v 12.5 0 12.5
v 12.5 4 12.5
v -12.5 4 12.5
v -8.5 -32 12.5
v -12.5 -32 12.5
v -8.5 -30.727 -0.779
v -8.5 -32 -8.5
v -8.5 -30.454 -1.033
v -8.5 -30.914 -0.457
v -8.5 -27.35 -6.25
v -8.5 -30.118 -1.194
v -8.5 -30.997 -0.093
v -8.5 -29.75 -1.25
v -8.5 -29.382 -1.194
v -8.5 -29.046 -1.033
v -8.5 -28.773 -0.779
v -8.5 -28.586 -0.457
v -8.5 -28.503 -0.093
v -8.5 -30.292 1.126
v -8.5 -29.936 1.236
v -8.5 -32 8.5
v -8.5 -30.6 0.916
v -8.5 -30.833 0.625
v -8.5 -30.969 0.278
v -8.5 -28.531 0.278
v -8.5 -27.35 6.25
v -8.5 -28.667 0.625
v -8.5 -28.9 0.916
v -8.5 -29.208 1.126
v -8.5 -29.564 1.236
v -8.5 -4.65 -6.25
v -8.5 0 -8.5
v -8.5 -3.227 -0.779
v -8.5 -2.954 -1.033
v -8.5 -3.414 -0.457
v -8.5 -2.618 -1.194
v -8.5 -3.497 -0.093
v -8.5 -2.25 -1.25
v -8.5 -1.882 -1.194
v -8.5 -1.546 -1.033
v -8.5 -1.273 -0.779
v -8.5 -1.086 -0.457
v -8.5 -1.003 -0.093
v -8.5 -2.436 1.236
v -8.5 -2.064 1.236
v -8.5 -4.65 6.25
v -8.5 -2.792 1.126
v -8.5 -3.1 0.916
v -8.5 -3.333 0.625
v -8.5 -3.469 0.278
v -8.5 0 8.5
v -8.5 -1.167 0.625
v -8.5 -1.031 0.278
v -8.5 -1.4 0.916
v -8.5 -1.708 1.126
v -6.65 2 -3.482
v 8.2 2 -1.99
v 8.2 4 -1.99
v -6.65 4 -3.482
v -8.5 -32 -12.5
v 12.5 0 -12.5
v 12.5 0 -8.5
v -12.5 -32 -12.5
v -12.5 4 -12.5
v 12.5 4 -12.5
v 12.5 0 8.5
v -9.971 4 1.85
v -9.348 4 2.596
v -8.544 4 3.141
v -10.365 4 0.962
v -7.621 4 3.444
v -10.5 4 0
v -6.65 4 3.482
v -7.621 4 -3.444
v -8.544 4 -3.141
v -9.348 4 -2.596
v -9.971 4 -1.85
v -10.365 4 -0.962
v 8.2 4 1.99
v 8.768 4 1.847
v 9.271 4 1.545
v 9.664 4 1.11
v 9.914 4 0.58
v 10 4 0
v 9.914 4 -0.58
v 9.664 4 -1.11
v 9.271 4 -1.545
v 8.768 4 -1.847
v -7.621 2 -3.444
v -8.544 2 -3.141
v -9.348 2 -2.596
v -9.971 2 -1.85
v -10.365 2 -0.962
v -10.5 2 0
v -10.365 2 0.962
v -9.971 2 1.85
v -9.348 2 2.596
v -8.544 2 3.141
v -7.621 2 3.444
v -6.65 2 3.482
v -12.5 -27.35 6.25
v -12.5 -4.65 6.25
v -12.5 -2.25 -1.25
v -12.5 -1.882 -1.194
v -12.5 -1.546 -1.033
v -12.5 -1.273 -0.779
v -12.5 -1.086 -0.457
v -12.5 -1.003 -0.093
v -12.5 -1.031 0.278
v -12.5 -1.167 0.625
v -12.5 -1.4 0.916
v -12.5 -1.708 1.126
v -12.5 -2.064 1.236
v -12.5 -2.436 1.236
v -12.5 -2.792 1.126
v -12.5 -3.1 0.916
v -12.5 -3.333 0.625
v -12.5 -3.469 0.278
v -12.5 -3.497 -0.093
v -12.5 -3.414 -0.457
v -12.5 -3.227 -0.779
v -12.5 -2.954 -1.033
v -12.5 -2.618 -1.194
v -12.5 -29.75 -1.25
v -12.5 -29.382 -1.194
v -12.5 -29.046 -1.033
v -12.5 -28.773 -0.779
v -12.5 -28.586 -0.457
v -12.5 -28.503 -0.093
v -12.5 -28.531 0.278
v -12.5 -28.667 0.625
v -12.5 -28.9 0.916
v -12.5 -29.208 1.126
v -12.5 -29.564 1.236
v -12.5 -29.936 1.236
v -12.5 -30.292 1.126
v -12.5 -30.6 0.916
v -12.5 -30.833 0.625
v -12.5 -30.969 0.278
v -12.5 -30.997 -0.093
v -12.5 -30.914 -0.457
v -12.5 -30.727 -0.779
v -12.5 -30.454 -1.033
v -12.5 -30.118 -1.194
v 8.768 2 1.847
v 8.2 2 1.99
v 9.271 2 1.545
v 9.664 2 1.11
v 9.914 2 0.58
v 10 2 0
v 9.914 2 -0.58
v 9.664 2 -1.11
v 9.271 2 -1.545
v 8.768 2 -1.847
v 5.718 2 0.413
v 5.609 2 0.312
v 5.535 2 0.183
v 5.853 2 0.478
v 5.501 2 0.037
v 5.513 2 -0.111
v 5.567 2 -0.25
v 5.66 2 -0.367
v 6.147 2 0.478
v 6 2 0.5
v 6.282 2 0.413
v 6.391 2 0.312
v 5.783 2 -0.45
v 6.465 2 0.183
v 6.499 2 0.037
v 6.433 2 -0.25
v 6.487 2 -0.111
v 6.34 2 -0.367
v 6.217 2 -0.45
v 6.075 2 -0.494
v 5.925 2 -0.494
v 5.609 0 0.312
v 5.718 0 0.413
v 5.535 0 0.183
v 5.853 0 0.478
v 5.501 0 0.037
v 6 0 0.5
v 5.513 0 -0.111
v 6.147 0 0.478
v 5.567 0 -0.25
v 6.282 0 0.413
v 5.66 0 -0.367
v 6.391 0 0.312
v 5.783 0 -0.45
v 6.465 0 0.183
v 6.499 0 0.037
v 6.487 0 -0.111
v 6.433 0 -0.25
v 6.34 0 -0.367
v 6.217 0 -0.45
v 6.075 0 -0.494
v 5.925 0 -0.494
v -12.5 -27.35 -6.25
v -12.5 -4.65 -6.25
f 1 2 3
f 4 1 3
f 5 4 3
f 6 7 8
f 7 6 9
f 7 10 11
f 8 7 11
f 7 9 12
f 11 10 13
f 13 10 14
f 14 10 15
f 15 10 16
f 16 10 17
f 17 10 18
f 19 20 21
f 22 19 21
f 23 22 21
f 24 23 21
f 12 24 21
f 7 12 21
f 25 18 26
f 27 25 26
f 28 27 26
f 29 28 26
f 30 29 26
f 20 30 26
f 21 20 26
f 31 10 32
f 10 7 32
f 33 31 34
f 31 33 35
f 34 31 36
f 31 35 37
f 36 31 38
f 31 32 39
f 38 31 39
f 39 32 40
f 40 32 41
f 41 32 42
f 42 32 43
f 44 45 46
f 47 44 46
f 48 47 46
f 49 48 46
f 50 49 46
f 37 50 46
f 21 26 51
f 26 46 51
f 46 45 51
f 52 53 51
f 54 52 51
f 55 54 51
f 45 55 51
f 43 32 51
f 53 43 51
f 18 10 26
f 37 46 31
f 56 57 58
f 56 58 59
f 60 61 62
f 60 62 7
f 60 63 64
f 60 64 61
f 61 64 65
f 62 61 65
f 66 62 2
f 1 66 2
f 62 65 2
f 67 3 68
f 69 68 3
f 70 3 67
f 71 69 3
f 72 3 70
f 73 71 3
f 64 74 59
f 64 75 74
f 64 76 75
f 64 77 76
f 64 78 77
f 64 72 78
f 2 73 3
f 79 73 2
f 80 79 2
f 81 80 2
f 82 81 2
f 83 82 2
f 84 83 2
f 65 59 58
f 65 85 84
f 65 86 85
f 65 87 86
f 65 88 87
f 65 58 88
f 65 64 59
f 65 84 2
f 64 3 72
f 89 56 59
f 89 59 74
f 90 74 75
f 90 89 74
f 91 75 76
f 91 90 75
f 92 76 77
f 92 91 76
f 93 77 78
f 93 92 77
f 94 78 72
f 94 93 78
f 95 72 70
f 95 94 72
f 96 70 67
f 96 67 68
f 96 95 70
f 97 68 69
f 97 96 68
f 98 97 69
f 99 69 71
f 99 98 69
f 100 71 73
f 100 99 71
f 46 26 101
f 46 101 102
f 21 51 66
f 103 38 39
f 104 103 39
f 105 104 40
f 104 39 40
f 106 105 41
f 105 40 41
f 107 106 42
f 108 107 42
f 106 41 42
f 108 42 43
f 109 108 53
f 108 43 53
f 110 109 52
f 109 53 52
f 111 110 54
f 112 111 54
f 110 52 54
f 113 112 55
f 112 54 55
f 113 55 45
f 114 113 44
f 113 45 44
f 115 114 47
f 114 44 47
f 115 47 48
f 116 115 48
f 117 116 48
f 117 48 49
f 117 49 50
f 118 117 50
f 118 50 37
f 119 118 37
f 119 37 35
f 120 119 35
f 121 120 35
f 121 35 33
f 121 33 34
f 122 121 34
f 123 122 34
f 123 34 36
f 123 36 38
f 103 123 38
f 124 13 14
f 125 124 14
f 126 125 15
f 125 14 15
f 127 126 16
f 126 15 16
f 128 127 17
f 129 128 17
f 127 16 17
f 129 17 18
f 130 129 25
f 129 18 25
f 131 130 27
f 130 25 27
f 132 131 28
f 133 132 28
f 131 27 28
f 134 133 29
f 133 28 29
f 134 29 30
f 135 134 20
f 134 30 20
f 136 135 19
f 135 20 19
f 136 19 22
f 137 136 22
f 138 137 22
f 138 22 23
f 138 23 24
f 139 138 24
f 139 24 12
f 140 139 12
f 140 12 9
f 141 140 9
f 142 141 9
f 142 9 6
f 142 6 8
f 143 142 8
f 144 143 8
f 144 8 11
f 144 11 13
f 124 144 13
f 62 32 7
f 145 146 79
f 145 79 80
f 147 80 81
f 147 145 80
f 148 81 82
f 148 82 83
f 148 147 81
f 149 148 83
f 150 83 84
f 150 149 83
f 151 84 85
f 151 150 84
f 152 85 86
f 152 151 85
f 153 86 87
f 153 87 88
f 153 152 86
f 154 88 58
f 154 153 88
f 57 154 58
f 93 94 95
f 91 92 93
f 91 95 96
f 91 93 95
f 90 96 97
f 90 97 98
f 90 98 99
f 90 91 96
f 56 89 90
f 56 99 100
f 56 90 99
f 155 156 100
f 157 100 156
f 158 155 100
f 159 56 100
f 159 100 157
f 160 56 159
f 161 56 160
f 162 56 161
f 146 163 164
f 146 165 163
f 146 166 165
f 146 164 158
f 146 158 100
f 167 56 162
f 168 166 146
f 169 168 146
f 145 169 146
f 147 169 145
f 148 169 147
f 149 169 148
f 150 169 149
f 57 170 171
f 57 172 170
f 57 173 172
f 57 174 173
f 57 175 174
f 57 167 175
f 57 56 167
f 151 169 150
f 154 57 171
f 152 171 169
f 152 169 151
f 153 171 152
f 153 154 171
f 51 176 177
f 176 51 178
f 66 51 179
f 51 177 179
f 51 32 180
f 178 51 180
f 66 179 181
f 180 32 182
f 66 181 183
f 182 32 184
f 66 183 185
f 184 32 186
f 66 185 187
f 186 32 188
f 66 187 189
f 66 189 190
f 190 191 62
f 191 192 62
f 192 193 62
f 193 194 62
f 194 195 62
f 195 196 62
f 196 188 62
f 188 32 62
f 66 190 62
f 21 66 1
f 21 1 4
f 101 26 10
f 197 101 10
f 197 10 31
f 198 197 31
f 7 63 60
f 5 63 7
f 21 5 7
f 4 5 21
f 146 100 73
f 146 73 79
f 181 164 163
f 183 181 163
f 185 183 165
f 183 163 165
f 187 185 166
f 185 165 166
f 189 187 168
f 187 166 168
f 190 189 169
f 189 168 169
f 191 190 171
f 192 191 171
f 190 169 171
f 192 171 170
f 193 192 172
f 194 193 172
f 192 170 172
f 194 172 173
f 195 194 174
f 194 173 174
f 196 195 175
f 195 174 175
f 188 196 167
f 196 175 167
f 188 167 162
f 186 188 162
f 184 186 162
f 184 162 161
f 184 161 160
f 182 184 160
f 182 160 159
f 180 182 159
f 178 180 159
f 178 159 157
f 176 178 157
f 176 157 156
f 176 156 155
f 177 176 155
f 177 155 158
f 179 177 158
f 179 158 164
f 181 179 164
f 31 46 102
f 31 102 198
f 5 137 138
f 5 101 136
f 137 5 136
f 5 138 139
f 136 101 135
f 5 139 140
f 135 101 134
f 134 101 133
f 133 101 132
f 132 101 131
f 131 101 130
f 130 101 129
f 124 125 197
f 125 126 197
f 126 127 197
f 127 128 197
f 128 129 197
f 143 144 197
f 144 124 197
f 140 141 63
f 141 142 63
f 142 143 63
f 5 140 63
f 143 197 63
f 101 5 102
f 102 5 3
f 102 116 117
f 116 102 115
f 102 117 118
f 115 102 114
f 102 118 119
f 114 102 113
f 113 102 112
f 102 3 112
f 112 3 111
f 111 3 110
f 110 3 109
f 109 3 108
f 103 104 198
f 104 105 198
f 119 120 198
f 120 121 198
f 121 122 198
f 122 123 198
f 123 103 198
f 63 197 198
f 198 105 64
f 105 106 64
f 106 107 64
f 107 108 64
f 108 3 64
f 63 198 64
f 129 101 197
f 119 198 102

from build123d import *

# Parameters (mm, degrees)
SKETCH_2_W               = 25
SKETCH_2_H               = 25
EXTRUDE_1_DEPTH          = 4
EXTRUDE_2_DEPTH          = 4
CUT_EXTRUDE_START        = -6
CUT_EXTRUDE_1_DEPTH      = 6
SKETCH_8_R               = 0.5
CUT_EXTRUDE_2_DEPTH      = 6
SKETCH_11_W              = 20.999639265
SKETCH_11_H              = 4
EXTRUDE_3_DEPTH          = 32
CUT_EXTRUDE_4_DEPTH      = 32
CUT_EXTRUDE_4_DEPTH_BACK = 32
SKETCH_13_R              = 1.25
SKETCH_13_W              = 12.5
SKETCH_13_H              = 22.7
CUT_EXTRUDE_5_DEPTH      = 41.264560711


with BuildPart() as part:
    # 草图2 → 凸台-拉伸1 (new body)
    with BuildSketch(Plane(origin=(0, 0, 0), x_dir=(1, 0, 0), z_dir=(0, 1, 0))):
        Rectangle(SKETCH_2_W, SKETCH_2_H)
    extrude(amount=EXTRUDE_1_DEPTH)

    # 草图3 → 凸台-拉伸2 (add)
    with BuildSketch(Plane(origin=(0, 4, 0), x_dir=(1, 0, 0), z_dir=(0, 1, 0))):
        with BuildLine():
            ThreePointArc((-3.5, 0), (-4.40433053, 2.347871376), (-6.65, 3.48245603))
            Line((-6.65, 3.48245603), (-6.65, -3.48245603))
            ThreePointArc((-6.65, -3.48245603), (-4.40433053, -2.347871376), (-3.5, 0))
        make_face()
        with BuildLine():
            Line((-6.65, -3.48245603), (-6.65, 3.48245603))
            ThreePointArc((-6.65, 3.48245603), (-10.5, 0), (-6.65, -3.48245603))
        make_face()
        with BuildLine():
            ThreePointArc((-3.5, 0), (-4.40433053, 2.347871376), (-6.65, 3.48245603))
            Line((-6.65, 3.48245603), (-6.65, -3.48245603))
            ThreePointArc((-6.65, -3.48245603), (-4.40433053, -2.347871376), (-3.5, 0))
        make_face()
        with BuildLine():
            Line((-6.65, -3.48245603), (-6.65, 3.48245603))
            ThreePointArc((-6.65, 3.48245603), (-10.5, 0), (-6.65, -3.48245603))
        make_face()
        with BuildLine():
            Line((8.2, 1.989974874), (-6.65, 3.48245603))
            ThreePointArc((-6.65, 3.48245603), (-4.40433053, 2.347871376), (-3.5, 0))
            ThreePointArc((-3.5, 0), (-4.40433053, -2.347871376), (-6.65, -3.48245603))
            Line((-6.65, -3.48245603), (8.2, -1.989974874))
            ThreePointArc((8.2, -1.989974874), (6, 0), (8.2, 1.989974874))
        make_face()
        with BuildLine():
            ThreePointArc((10, 0), (9.483239697, 1.341640786), (8.2, 1.989974874))
            Line((8.2, 1.989974874), (8.2, -1.989974874))
            ThreePointArc((8.2, -1.989974874), (9.483239697, -1.341640786), (10, 0))
        make_face()
        with BuildLine():
            Line((8.2, -1.989974874), (8.2, 1.989974874))
            ThreePointArc((8.2, 1.989974874), (6, 0), (8.2, -1.989974874))
        make_face()
        with BuildLine():
            ThreePointArc((10, 0), (9.483239697, 1.341640786), (8.2, 1.989974874))
            Line((8.2, 1.989974874), (8.2, -1.989974874))
            ThreePointArc((8.2, -1.989974874), (9.483239697, -1.341640786), (10, 0))
        make_face()
        with BuildLine():
            Line((8.2, -1.989974874), (8.2, 1.989974874))
            ThreePointArc((8.2, 1.989974874), (6, 0), (8.2, -1.989974874))
        make_face()
    extrude(amount=EXTRUDE_2_DEPTH)

    # 草图7 → 切除-拉伸1 (cut)
    with BuildSketch(Plane(origin=(0, 8, 0), x_dir=(1, 0, 0), z_dir=(0, 1, 0)).offset(CUT_EXTRUDE_START)):
        with BuildLine():
            Line((-6.65, -3.48245603), (8.2, -1.989974874))
            ThreePointArc((8.2, -1.989974874), (10, 0), (8.2, 1.989974874))
            Line((8.2, 1.989974874), (-6.65, 3.48245603))
            ThreePointArc((-6.65, 3.48245603), (-10.5, 0), (-6.65, -3.48245603))
        make_face()
    extrude(amount=CUT_EXTRUDE_1_DEPTH, mode=Mode.SUBTRACT)

    # 草图8 → 切除-拉伸2 (cut)
    with BuildSketch(Plane(origin=(0, 2, 0), x_dir=(1, 0, 0), z_dir=(0, 1, 0))):
        with Locations(Location((6, 0, 0), (0, 0, 270))):
            Circle(SKETCH_8_R)
    extrude(amount=-CUT_EXTRUDE_2_DEPTH, mode=Mode.SUBTRACT)

    # 草图11 → 凸台-拉伸3 (add)
    with BuildSketch(Plane.XZ):
        with Locations((2.000180367, 10.5)):
            Rectangle(SKETCH_11_W, SKETCH_11_H)
        Polygon((-8.499639265, 8.5), (-8.499639265, 12.5), (-12.5, 12.5), (-12.5, -12.5), (-8.499639265, -12.5), (-8.499639265, -8.5), align=None)
        with Locations((2.000180367, -10.5)):
            Rectangle(SKETCH_11_W, SKETCH_11_H)
    extrude(amount=EXTRUDE_3_DEPTH)

    # 草图12 → 切除-拉伸4 (cut, two sides: drawn at the far end of the back side and taken through both)
    with BuildSketch(Plane.XY.offset(-8.5).offset(-CUT_EXTRUDE_4_DEPTH_BACK)):
        Polygon((12.5, 0), (-8.499639265, -32), (12.5, -32), align=None)
    extrude(amount=CUT_EXTRUDE_4_DEPTH + CUT_EXTRUDE_4_DEPTH_BACK, mode=Mode.SUBTRACT)

    # 草图13 → 切除-拉伸5 (cut, through all)
    with BuildSketch(Plane(origin=(-8.499639265, 0, 0), x_dir=(0, 0, -1), z_dir=(1, 0, 0))):
        with Locations((0, -29.75)):
            Circle(SKETCH_13_R)
        with Locations((0, -2.25)):
            Circle(SKETCH_13_R)
        with Locations((0, -16)):
            Rectangle(SKETCH_13_W, SKETCH_13_H)
    extrude(amount=-CUT_EXTRUDE_5_DEPTH, mode=Mode.SUBTRACT)


solid = part.part
